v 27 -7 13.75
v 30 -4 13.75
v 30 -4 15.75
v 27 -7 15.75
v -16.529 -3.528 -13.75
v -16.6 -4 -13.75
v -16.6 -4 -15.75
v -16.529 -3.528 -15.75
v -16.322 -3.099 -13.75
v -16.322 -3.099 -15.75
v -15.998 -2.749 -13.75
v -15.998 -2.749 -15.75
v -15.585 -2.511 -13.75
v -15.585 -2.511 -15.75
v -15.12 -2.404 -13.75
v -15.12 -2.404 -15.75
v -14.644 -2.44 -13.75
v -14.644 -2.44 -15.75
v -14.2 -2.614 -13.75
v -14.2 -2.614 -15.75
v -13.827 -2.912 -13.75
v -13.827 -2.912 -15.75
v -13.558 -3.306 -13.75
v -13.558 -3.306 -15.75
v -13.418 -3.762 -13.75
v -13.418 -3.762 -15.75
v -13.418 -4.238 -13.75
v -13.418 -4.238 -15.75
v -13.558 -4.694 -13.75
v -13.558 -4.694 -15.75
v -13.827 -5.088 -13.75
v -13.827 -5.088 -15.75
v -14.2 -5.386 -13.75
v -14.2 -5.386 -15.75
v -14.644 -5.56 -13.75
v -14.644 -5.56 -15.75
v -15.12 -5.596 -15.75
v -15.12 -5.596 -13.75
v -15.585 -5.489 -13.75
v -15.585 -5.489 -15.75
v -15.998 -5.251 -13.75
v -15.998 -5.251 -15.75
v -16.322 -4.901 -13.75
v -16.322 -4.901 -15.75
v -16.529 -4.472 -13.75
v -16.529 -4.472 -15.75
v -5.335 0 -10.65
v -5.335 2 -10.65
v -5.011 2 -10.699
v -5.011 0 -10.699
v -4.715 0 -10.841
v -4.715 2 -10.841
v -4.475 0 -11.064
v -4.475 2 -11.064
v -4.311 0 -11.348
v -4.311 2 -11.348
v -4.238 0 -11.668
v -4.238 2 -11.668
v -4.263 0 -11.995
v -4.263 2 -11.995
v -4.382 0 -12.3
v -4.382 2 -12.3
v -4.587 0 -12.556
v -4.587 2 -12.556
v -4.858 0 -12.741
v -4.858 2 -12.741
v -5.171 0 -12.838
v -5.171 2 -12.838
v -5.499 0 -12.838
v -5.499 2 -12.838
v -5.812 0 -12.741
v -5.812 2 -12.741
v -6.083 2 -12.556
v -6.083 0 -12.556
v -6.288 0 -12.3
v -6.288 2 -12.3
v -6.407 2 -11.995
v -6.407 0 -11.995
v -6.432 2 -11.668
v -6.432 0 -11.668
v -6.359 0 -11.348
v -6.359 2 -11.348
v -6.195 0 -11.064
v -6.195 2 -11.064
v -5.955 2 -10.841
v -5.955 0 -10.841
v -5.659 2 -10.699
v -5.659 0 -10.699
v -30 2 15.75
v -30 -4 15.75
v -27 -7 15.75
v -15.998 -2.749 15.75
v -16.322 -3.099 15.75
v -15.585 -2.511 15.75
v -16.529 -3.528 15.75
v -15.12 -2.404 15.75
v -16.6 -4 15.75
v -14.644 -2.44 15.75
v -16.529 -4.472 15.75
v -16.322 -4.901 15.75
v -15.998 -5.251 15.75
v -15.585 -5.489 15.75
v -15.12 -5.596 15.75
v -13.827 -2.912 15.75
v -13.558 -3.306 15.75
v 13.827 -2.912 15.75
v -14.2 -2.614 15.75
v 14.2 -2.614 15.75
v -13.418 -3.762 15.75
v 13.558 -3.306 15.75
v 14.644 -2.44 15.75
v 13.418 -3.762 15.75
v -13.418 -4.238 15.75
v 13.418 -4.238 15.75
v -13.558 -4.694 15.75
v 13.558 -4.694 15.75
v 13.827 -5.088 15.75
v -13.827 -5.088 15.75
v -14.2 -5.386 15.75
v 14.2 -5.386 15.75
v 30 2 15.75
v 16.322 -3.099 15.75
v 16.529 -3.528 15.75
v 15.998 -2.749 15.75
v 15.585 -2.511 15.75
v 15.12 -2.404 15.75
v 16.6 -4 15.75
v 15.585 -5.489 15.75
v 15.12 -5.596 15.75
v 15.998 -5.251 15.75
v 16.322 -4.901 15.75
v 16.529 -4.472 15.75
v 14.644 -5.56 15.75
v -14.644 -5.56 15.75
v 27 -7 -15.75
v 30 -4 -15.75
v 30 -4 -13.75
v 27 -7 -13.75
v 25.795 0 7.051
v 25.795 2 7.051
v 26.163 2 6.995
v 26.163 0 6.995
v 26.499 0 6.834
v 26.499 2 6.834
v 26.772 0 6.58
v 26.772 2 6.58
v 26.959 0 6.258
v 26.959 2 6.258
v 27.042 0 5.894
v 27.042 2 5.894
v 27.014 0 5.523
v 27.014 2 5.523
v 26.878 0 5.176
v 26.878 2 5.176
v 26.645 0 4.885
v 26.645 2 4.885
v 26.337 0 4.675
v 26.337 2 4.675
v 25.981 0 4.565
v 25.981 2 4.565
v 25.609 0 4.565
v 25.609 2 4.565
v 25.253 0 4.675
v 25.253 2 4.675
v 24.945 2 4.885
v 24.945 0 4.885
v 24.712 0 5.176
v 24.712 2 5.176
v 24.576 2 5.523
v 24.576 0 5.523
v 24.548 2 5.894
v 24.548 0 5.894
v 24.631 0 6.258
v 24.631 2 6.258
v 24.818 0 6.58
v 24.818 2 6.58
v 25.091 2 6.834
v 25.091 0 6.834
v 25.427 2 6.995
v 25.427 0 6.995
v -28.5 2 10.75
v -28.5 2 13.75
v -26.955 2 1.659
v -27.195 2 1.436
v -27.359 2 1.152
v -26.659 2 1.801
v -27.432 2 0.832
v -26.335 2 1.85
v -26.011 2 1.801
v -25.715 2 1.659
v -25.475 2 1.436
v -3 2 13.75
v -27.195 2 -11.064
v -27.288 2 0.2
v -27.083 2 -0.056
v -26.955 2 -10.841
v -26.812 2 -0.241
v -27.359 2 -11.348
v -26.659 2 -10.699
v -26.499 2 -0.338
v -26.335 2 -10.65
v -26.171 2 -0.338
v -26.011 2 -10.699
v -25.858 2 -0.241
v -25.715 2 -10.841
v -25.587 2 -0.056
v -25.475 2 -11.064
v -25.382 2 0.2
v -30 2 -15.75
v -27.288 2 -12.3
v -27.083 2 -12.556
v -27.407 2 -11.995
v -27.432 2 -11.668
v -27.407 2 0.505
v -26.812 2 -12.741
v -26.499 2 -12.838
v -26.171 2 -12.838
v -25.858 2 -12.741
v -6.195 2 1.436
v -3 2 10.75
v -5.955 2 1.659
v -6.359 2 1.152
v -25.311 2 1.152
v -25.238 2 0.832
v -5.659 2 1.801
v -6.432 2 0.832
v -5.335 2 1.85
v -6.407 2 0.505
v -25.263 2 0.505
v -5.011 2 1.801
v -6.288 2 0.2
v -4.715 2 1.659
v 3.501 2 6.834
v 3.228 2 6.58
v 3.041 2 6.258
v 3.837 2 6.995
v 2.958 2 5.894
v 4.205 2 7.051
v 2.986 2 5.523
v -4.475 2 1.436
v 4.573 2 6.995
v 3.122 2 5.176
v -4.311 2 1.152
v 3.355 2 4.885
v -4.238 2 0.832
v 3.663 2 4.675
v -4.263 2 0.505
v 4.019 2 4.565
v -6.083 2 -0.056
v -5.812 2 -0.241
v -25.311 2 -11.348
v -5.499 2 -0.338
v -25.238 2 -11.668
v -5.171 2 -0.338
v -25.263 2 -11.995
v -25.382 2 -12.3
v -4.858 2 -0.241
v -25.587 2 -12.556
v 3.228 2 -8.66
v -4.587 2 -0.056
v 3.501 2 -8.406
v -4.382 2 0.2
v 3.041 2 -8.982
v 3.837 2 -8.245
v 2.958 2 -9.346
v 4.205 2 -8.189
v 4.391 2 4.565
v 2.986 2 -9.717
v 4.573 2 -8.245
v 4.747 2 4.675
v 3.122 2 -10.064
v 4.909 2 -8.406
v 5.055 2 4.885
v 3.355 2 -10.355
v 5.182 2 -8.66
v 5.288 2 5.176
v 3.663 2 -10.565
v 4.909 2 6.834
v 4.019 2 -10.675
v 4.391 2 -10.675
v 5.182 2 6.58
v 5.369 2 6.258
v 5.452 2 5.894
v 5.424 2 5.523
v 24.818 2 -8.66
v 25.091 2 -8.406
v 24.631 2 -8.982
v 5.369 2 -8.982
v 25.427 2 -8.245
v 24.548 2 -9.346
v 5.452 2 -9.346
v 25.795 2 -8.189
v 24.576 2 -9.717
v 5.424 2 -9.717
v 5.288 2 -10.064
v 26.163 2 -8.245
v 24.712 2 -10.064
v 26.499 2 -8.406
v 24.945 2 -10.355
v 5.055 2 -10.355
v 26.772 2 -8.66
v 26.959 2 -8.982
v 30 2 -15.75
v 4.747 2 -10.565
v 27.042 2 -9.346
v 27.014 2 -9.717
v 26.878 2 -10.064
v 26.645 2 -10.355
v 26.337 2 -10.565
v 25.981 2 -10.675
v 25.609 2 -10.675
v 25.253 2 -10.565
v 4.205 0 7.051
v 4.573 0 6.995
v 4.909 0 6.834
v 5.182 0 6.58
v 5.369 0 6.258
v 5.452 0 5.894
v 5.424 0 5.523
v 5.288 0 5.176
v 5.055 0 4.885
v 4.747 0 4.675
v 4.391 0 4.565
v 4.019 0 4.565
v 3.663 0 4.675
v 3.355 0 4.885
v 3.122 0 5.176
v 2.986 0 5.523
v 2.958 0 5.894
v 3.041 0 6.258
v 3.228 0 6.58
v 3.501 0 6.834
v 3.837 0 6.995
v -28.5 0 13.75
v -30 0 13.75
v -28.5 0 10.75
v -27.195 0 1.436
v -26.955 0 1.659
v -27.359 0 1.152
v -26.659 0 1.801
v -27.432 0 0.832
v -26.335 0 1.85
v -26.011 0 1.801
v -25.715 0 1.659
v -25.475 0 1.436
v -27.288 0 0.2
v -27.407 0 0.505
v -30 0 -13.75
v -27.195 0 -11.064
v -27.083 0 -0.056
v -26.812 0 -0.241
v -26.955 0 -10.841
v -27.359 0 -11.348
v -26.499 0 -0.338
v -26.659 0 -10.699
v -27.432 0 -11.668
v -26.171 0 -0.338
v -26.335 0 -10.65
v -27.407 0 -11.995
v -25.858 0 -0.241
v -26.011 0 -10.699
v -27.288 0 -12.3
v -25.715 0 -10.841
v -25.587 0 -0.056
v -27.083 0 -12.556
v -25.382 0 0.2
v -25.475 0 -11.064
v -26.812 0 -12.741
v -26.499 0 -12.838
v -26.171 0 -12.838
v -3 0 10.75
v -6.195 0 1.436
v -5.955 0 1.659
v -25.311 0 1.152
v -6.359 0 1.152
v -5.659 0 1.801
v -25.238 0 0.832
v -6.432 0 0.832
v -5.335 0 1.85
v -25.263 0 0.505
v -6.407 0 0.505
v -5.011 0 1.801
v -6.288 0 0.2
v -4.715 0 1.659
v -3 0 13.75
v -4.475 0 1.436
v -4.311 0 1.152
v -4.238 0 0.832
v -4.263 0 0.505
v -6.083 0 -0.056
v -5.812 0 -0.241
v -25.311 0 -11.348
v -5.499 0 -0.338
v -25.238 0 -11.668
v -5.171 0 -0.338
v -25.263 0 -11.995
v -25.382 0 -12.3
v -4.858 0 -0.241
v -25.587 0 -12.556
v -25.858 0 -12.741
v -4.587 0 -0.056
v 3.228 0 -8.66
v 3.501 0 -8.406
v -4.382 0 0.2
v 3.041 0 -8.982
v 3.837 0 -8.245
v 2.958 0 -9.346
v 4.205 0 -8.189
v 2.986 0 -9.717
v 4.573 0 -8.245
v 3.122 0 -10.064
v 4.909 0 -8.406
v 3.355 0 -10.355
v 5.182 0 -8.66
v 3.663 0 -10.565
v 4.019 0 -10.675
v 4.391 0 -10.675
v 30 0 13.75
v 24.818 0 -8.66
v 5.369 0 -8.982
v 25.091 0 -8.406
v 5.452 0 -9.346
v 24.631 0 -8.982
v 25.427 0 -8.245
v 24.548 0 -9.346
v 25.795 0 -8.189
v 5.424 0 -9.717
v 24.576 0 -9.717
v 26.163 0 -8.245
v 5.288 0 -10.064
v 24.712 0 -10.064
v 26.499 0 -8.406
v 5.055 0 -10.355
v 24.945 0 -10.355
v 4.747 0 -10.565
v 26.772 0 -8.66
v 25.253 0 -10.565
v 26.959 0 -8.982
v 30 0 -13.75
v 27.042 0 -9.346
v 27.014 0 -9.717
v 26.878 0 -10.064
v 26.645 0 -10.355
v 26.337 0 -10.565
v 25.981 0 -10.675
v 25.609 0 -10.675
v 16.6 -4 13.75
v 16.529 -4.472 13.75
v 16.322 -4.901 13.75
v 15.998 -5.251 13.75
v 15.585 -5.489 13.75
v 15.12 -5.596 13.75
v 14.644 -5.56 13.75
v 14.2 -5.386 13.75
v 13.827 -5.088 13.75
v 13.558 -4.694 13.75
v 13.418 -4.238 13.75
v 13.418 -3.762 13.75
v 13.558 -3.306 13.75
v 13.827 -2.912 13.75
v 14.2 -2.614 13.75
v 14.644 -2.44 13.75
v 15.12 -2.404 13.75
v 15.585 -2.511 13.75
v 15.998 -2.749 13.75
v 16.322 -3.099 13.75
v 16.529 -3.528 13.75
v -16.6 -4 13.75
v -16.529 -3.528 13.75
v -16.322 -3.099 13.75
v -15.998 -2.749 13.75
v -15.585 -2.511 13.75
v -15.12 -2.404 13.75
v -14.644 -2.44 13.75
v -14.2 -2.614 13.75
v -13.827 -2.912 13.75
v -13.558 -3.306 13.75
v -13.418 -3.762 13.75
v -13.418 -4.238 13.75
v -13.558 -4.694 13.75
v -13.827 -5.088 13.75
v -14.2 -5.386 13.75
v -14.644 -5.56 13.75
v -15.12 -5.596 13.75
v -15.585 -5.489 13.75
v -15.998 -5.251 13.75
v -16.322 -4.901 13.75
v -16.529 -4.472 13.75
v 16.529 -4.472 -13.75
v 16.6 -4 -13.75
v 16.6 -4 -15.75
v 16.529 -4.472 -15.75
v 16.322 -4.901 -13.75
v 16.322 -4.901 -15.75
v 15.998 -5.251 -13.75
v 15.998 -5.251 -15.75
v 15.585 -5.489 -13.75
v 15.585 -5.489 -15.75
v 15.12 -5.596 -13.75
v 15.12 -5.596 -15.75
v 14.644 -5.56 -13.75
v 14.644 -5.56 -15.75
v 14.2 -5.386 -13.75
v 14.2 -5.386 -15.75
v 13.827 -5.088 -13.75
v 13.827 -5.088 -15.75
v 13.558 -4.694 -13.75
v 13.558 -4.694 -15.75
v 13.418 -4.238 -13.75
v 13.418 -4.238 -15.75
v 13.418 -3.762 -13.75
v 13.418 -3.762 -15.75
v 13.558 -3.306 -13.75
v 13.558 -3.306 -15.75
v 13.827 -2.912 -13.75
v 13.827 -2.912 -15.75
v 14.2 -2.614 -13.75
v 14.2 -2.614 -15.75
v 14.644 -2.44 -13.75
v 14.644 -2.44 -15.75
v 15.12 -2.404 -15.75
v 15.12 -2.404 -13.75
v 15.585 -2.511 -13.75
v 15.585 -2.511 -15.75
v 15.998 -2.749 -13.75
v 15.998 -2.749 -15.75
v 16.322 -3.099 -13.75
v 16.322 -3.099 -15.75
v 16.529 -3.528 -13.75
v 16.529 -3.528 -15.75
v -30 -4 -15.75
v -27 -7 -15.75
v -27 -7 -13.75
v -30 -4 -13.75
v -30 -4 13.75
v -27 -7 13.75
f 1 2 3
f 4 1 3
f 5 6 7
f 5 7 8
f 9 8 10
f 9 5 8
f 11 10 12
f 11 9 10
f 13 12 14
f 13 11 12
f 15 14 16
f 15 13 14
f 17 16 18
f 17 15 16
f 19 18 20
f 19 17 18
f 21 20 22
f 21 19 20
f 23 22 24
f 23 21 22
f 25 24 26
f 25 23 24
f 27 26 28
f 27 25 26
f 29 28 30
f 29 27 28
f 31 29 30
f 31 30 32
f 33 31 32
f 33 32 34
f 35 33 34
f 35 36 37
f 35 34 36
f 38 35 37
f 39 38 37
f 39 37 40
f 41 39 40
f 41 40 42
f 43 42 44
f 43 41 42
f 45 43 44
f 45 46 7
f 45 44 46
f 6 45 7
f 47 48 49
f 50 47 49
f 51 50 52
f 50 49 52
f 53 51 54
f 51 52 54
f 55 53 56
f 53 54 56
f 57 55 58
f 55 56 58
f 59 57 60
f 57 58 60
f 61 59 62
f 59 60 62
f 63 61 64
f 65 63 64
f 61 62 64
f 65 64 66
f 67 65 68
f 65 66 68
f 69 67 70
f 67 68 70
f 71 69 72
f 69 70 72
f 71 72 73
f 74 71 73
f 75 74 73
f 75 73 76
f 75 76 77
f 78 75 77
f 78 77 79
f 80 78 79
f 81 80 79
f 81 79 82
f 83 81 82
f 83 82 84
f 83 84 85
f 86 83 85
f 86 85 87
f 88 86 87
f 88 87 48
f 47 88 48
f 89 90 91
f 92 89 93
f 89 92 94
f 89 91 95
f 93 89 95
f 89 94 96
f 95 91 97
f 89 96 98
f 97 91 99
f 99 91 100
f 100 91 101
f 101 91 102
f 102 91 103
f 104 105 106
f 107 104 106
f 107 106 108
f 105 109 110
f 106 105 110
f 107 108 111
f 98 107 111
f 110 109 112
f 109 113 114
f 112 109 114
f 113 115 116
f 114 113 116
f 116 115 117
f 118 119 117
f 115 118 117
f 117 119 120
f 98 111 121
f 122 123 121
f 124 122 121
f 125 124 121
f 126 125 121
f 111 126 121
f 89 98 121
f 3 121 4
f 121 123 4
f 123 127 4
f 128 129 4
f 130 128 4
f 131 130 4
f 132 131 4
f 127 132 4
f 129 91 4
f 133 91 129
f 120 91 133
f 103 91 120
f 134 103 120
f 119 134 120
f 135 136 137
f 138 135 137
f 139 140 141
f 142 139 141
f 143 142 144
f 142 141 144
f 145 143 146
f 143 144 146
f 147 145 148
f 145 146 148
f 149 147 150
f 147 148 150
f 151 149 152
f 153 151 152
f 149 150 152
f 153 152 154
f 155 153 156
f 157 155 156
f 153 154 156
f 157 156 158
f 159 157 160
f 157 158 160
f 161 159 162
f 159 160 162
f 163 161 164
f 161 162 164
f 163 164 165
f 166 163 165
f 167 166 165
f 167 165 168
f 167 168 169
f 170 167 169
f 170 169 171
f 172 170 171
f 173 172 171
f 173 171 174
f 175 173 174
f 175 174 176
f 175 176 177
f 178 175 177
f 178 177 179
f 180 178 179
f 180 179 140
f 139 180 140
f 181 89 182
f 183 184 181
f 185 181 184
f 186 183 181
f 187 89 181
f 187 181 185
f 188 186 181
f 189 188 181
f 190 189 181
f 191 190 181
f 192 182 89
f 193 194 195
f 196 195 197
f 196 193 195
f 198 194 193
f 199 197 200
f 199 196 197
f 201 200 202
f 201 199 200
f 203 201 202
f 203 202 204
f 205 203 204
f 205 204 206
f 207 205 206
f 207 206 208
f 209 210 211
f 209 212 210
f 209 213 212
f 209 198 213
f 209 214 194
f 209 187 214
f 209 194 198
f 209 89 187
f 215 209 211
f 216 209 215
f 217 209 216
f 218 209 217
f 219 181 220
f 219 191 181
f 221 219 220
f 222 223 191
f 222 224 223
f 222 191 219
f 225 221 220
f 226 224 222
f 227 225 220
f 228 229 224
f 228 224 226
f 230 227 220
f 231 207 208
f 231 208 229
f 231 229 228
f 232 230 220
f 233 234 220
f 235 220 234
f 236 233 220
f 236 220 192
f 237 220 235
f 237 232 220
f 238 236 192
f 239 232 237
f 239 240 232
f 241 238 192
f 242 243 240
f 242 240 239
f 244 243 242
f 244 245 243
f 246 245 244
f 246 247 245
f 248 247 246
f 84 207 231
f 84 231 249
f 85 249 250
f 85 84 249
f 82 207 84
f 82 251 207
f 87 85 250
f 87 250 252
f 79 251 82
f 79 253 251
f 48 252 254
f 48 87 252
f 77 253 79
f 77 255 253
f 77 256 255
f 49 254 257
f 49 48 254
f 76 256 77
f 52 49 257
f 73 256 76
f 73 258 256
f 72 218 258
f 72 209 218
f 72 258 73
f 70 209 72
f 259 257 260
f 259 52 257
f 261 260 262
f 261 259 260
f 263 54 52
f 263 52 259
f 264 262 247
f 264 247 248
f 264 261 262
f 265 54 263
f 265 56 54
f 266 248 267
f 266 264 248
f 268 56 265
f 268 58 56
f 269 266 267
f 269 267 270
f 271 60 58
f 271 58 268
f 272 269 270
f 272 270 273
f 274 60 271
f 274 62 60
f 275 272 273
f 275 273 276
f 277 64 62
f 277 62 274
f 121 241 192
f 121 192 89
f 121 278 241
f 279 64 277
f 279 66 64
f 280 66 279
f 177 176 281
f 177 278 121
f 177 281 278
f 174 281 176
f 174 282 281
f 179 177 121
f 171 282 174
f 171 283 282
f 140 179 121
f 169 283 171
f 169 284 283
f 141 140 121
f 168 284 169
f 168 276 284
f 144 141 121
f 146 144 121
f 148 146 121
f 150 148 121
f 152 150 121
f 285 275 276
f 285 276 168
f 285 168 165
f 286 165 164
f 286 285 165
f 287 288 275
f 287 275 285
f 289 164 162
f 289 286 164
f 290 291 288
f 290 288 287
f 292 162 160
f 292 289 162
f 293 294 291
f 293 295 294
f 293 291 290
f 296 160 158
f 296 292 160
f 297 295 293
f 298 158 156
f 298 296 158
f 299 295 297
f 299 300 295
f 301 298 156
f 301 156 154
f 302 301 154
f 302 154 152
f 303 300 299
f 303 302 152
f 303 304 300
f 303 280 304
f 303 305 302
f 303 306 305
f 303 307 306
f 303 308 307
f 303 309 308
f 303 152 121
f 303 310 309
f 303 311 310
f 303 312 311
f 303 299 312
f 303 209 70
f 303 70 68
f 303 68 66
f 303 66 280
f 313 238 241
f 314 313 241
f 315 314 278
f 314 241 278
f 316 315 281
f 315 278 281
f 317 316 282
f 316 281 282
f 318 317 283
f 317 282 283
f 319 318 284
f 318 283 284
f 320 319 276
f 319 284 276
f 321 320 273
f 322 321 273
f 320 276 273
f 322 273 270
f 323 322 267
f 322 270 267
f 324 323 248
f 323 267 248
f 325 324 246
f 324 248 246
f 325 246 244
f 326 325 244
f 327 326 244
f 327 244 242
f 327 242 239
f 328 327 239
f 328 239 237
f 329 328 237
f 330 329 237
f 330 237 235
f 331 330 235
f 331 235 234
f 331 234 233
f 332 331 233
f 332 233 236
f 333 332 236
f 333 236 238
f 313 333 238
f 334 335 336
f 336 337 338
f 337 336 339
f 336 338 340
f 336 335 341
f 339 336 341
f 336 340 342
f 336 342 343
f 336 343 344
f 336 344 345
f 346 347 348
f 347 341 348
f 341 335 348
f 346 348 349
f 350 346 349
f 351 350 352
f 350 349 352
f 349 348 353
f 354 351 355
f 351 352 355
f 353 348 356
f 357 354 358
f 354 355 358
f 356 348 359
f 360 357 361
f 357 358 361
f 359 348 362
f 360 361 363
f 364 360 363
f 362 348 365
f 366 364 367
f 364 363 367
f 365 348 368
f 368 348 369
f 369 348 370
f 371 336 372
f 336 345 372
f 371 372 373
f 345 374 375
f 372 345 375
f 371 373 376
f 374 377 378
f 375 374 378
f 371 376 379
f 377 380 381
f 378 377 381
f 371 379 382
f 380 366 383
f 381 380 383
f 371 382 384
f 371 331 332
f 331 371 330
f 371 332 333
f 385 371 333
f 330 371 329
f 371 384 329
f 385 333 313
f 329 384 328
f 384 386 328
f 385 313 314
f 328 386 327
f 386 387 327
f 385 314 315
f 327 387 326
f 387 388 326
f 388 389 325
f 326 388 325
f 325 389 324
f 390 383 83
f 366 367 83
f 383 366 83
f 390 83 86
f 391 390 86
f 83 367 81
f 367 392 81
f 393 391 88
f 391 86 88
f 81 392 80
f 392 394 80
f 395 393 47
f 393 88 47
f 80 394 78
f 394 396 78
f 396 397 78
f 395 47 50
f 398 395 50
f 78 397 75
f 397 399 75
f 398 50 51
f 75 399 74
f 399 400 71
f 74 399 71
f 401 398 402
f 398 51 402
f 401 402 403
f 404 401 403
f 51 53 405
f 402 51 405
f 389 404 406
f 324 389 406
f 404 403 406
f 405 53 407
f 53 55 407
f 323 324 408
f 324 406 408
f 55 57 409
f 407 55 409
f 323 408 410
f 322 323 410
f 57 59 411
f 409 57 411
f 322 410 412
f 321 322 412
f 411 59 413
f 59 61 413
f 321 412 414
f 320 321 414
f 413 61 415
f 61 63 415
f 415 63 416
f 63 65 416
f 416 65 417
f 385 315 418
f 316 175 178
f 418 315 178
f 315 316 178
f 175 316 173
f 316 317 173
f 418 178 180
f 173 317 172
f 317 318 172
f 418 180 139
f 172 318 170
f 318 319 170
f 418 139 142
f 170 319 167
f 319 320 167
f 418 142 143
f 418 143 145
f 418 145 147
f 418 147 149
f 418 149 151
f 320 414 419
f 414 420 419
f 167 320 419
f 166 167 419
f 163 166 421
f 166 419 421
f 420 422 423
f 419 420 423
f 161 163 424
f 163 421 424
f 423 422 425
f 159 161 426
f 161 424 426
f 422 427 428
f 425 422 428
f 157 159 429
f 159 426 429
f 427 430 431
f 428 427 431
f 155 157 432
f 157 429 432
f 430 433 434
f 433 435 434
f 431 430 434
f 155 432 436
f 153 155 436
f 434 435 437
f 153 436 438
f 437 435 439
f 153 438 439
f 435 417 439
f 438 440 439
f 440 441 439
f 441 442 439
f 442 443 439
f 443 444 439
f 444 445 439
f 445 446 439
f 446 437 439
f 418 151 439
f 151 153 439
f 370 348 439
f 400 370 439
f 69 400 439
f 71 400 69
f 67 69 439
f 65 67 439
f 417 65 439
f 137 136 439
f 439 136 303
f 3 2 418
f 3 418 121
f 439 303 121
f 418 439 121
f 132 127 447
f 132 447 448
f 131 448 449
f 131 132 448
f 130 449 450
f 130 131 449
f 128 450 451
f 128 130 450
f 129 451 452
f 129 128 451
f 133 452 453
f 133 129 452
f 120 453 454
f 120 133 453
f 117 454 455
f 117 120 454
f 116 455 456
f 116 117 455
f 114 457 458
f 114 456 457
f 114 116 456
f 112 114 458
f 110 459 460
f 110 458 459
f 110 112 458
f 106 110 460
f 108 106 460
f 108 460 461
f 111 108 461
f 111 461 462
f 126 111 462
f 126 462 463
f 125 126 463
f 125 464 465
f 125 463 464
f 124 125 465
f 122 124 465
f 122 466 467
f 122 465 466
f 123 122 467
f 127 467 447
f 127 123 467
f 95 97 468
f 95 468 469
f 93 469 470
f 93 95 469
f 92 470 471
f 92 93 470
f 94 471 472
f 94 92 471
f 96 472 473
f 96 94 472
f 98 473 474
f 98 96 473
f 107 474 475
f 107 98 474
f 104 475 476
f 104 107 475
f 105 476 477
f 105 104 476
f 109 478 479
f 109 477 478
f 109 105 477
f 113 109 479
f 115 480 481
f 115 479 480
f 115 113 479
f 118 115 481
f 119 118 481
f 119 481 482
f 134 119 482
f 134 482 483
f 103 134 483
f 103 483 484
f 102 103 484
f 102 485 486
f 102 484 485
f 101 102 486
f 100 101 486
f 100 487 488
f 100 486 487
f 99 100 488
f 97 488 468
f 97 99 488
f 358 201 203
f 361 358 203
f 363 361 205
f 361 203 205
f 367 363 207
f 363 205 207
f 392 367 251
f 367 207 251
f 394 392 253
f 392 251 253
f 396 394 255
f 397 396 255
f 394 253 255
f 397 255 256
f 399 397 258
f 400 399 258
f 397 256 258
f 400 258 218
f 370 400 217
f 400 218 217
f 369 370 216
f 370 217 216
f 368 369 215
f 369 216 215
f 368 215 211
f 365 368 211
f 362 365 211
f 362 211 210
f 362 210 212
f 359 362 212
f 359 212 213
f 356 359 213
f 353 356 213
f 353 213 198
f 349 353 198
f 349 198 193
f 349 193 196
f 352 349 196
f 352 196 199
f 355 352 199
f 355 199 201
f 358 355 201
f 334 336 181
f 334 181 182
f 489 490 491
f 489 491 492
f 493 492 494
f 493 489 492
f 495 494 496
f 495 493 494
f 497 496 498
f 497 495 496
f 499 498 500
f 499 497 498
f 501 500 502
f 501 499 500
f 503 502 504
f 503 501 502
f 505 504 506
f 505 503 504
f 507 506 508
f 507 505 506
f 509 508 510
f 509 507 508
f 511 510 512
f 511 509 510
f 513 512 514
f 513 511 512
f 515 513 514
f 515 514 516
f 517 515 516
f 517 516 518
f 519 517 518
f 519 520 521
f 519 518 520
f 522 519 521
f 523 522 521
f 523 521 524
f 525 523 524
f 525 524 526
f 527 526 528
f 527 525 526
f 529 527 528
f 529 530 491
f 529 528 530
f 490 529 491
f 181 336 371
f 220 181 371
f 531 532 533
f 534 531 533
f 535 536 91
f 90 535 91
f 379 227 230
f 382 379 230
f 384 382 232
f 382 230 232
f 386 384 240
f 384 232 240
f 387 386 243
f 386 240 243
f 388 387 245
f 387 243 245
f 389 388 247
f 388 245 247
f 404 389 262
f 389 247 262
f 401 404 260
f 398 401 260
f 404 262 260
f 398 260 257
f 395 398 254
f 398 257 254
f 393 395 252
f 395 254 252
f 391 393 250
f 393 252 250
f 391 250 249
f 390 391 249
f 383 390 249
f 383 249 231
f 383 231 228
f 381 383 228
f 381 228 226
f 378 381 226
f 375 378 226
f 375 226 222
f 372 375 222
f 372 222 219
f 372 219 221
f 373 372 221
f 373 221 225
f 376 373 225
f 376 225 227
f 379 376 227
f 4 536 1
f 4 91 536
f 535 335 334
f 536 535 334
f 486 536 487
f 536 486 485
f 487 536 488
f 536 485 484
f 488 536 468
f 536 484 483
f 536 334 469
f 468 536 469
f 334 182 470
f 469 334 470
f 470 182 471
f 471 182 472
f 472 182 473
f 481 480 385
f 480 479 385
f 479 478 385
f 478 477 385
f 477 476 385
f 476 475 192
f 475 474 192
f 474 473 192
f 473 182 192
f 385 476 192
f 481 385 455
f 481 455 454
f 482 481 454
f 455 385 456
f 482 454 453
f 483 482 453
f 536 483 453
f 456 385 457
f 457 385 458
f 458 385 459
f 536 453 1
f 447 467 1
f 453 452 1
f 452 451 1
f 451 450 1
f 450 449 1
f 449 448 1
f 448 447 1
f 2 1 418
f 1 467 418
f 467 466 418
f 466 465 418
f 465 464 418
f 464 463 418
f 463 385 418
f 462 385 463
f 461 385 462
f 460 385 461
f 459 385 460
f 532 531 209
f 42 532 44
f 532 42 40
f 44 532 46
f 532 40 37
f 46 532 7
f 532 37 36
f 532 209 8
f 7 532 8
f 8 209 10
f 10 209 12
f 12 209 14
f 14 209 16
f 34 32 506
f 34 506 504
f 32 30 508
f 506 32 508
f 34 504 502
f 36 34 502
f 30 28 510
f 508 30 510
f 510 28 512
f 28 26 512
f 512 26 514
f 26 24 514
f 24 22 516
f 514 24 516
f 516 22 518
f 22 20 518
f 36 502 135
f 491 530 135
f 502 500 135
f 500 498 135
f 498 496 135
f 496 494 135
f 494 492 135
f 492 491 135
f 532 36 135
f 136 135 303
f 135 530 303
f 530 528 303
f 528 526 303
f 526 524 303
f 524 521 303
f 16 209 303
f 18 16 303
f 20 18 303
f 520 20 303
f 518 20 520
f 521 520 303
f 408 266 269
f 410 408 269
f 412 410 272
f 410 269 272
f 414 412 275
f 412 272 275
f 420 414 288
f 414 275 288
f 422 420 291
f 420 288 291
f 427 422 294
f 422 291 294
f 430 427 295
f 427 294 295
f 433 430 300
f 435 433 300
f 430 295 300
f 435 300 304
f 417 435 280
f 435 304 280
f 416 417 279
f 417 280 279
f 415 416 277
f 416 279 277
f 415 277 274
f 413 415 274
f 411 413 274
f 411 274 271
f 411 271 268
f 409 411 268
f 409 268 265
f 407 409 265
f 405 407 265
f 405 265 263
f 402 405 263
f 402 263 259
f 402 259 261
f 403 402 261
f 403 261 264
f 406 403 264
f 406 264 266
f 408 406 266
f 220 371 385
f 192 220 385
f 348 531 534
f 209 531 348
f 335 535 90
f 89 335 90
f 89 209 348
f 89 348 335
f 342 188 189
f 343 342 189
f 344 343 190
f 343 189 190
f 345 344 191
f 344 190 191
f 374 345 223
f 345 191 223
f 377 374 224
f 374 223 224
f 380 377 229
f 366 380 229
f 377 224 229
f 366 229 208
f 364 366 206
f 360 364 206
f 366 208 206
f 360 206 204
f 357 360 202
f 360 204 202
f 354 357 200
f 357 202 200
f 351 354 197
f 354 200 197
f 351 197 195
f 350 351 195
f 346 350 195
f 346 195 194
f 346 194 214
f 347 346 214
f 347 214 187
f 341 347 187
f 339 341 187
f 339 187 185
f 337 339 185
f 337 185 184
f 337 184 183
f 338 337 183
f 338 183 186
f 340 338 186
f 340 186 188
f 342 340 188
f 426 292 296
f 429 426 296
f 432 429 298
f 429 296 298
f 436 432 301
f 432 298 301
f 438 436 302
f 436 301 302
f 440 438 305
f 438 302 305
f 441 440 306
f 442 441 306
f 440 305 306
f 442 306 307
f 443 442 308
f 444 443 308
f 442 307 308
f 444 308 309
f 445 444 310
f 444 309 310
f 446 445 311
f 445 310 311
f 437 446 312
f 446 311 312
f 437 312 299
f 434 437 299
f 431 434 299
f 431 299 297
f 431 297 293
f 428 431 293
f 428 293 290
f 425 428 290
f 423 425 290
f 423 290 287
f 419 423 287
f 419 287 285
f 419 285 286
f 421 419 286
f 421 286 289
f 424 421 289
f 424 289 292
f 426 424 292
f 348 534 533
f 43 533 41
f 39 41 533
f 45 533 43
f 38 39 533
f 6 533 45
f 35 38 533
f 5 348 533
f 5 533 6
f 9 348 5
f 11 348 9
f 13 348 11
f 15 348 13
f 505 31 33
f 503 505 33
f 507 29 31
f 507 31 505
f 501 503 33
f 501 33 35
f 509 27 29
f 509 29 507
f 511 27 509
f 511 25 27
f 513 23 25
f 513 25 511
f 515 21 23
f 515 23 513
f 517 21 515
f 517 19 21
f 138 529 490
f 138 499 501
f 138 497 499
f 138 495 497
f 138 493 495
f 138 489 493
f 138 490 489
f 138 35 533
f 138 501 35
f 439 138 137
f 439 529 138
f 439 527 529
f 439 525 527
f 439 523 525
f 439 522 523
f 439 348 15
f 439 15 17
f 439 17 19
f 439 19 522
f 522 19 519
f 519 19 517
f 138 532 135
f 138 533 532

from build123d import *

# Parameters (mm, degrees)
SKETCH1_W               = 60
SKETCH1_H               = 31.5
BOSS_EXTRUDE1_DEPTH     = 2
SKETCH2_W               = 60
SKETCH2_H               = 2
BOSS_EXTRUDE2_DEPTH     = 7
CUT_EXTRUDE1_DEPTH      = 45.0596187
CUT_EXTRUDE1_DEPTH_BACK = 45.0596187
SKETCH3_R               = 1.6
CHAMFER1_SIZE           = 3
CHAMFER3_SIZE           = 3
SKETCH4_R               = 1.25
SKETCH4_R_2             = 1.1
CUT_EXTRUDE2_DEPTH      = 10
SKETCH5_W               = 25.5
SKETCH5_H               = 3
CUT_EXTRUDE3_DEPTH      = 10


with BuildPart() as part:
    # Sketch1 → Boss-Extrude1 (new body)
    with BuildSketch(Plane(origin=(0, 0, 0), x_dir=(1, 0, 0), z_dir=(0, 1, 0))):
        Rectangle(SKETCH1_W, SKETCH1_H)
    extrude(amount=BOSS_EXTRUDE1_DEPTH)

    # Sketch2 → Boss-Extrude2 (add)
    with BuildSketch(Plane.XZ):
        with Locations((0, -14.75)):
            Rectangle(SKETCH2_W, SKETCH2_H)
        with Locations((0, 14.75)):
            Rectangle(SKETCH2_W, SKETCH2_H)
    extrude(amount=BOSS_EXTRUDE2_DEPTH)

    # Sketch3 → Cut-Extrude1 (cut, two sides: drawn at the far end of the back side and taken through both)
    with BuildSketch(Plane(origin=(0, 0, -15.75), x_dir=(-1, 0, 0), z_dir=(0, 0, -1)).offset(-CUT_EXTRUDE1_DEPTH_BACK)):
        with Locations((15, -4)):
            Circle(SKETCH3_R)
        with Locations(Location((-15, -4, 0), (0, 0, 180))):
            Circle(SKETCH3_R)
    extrude(amount=CUT_EXTRUDE1_DEPTH + CUT_EXTRUDE1_DEPTH_BACK, mode=Mode.SUBTRACT)

    # Chamfer1
    chamfer1_edges = [part.edges().sort_by_distance(p)[0] for p in [
        (30, -7, -14.75),
        (-30, -7, -14.75),
    ]]
    chamfer(chamfer1_edges, length=CHAMFER1_SIZE)

    # Chamfer3
    chamfer3_edges = [part.edges().sort_by_distance(p)[0] for p in [
        (30, -7, 14.75),
        (-30, -7, 14.75),
    ]]
    chamfer(chamfer3_edges, length=CHAMFER3_SIZE)

    # Sketch4 → Cut-Extrude2 (cut)
    with BuildSketch(Plane(origin=(0, 2, 0), x_dir=(1, 0, 0), z_dir=(0, 1, 0))):
        with Locations(Location((25.795, -5.801, 0), (0, 0, 270))):
            Circle(SKETCH4_R)
        with Locations(Location((4.205, -5.801, 0), (0, 0, 270))):
            Circle(SKETCH4_R)
        with Locations(Location((25.795, 9.439, 0), (0, 0, 270))):
            Circle(SKETCH4_R)
        with Locations(Location((4.205, 9.439, 0), (0, 0, 270))):
            Circle(SKETCH4_R)
        with Locations(Location((-26.335, -0.75, 0), (0, 0, 270))):
            Circle(SKETCH4_R_2)
        with Locations(Location((-26.335, 11.75, 0), (0, 0, 270))):
            Circle(SKETCH4_R_2)
        with Locations(Location((-5.335, -0.75, 0), (0, 0, 270))):
            Circle(SKETCH4_R_2)
        with Locations(Location((-5.335, 11.75, 0), (0, 0, 270))):
            Circle(SKETCH4_R_2)
    extrude(amount=-CUT_EXTRUDE2_DEPTH, mode=Mode.SUBTRACT)

    # Sketch5 → Cut-Extrude3 (cut)
    with BuildSketch(Plane.XZ):
        with Locations((-15.75, 12.25)):
            Rectangle(SKETCH5_W, SKETCH5_H)
    extrude(amount=-CUT_EXTRUDE3_DEPTH, mode=Mode.SUBTRACT)


solid = part.part
